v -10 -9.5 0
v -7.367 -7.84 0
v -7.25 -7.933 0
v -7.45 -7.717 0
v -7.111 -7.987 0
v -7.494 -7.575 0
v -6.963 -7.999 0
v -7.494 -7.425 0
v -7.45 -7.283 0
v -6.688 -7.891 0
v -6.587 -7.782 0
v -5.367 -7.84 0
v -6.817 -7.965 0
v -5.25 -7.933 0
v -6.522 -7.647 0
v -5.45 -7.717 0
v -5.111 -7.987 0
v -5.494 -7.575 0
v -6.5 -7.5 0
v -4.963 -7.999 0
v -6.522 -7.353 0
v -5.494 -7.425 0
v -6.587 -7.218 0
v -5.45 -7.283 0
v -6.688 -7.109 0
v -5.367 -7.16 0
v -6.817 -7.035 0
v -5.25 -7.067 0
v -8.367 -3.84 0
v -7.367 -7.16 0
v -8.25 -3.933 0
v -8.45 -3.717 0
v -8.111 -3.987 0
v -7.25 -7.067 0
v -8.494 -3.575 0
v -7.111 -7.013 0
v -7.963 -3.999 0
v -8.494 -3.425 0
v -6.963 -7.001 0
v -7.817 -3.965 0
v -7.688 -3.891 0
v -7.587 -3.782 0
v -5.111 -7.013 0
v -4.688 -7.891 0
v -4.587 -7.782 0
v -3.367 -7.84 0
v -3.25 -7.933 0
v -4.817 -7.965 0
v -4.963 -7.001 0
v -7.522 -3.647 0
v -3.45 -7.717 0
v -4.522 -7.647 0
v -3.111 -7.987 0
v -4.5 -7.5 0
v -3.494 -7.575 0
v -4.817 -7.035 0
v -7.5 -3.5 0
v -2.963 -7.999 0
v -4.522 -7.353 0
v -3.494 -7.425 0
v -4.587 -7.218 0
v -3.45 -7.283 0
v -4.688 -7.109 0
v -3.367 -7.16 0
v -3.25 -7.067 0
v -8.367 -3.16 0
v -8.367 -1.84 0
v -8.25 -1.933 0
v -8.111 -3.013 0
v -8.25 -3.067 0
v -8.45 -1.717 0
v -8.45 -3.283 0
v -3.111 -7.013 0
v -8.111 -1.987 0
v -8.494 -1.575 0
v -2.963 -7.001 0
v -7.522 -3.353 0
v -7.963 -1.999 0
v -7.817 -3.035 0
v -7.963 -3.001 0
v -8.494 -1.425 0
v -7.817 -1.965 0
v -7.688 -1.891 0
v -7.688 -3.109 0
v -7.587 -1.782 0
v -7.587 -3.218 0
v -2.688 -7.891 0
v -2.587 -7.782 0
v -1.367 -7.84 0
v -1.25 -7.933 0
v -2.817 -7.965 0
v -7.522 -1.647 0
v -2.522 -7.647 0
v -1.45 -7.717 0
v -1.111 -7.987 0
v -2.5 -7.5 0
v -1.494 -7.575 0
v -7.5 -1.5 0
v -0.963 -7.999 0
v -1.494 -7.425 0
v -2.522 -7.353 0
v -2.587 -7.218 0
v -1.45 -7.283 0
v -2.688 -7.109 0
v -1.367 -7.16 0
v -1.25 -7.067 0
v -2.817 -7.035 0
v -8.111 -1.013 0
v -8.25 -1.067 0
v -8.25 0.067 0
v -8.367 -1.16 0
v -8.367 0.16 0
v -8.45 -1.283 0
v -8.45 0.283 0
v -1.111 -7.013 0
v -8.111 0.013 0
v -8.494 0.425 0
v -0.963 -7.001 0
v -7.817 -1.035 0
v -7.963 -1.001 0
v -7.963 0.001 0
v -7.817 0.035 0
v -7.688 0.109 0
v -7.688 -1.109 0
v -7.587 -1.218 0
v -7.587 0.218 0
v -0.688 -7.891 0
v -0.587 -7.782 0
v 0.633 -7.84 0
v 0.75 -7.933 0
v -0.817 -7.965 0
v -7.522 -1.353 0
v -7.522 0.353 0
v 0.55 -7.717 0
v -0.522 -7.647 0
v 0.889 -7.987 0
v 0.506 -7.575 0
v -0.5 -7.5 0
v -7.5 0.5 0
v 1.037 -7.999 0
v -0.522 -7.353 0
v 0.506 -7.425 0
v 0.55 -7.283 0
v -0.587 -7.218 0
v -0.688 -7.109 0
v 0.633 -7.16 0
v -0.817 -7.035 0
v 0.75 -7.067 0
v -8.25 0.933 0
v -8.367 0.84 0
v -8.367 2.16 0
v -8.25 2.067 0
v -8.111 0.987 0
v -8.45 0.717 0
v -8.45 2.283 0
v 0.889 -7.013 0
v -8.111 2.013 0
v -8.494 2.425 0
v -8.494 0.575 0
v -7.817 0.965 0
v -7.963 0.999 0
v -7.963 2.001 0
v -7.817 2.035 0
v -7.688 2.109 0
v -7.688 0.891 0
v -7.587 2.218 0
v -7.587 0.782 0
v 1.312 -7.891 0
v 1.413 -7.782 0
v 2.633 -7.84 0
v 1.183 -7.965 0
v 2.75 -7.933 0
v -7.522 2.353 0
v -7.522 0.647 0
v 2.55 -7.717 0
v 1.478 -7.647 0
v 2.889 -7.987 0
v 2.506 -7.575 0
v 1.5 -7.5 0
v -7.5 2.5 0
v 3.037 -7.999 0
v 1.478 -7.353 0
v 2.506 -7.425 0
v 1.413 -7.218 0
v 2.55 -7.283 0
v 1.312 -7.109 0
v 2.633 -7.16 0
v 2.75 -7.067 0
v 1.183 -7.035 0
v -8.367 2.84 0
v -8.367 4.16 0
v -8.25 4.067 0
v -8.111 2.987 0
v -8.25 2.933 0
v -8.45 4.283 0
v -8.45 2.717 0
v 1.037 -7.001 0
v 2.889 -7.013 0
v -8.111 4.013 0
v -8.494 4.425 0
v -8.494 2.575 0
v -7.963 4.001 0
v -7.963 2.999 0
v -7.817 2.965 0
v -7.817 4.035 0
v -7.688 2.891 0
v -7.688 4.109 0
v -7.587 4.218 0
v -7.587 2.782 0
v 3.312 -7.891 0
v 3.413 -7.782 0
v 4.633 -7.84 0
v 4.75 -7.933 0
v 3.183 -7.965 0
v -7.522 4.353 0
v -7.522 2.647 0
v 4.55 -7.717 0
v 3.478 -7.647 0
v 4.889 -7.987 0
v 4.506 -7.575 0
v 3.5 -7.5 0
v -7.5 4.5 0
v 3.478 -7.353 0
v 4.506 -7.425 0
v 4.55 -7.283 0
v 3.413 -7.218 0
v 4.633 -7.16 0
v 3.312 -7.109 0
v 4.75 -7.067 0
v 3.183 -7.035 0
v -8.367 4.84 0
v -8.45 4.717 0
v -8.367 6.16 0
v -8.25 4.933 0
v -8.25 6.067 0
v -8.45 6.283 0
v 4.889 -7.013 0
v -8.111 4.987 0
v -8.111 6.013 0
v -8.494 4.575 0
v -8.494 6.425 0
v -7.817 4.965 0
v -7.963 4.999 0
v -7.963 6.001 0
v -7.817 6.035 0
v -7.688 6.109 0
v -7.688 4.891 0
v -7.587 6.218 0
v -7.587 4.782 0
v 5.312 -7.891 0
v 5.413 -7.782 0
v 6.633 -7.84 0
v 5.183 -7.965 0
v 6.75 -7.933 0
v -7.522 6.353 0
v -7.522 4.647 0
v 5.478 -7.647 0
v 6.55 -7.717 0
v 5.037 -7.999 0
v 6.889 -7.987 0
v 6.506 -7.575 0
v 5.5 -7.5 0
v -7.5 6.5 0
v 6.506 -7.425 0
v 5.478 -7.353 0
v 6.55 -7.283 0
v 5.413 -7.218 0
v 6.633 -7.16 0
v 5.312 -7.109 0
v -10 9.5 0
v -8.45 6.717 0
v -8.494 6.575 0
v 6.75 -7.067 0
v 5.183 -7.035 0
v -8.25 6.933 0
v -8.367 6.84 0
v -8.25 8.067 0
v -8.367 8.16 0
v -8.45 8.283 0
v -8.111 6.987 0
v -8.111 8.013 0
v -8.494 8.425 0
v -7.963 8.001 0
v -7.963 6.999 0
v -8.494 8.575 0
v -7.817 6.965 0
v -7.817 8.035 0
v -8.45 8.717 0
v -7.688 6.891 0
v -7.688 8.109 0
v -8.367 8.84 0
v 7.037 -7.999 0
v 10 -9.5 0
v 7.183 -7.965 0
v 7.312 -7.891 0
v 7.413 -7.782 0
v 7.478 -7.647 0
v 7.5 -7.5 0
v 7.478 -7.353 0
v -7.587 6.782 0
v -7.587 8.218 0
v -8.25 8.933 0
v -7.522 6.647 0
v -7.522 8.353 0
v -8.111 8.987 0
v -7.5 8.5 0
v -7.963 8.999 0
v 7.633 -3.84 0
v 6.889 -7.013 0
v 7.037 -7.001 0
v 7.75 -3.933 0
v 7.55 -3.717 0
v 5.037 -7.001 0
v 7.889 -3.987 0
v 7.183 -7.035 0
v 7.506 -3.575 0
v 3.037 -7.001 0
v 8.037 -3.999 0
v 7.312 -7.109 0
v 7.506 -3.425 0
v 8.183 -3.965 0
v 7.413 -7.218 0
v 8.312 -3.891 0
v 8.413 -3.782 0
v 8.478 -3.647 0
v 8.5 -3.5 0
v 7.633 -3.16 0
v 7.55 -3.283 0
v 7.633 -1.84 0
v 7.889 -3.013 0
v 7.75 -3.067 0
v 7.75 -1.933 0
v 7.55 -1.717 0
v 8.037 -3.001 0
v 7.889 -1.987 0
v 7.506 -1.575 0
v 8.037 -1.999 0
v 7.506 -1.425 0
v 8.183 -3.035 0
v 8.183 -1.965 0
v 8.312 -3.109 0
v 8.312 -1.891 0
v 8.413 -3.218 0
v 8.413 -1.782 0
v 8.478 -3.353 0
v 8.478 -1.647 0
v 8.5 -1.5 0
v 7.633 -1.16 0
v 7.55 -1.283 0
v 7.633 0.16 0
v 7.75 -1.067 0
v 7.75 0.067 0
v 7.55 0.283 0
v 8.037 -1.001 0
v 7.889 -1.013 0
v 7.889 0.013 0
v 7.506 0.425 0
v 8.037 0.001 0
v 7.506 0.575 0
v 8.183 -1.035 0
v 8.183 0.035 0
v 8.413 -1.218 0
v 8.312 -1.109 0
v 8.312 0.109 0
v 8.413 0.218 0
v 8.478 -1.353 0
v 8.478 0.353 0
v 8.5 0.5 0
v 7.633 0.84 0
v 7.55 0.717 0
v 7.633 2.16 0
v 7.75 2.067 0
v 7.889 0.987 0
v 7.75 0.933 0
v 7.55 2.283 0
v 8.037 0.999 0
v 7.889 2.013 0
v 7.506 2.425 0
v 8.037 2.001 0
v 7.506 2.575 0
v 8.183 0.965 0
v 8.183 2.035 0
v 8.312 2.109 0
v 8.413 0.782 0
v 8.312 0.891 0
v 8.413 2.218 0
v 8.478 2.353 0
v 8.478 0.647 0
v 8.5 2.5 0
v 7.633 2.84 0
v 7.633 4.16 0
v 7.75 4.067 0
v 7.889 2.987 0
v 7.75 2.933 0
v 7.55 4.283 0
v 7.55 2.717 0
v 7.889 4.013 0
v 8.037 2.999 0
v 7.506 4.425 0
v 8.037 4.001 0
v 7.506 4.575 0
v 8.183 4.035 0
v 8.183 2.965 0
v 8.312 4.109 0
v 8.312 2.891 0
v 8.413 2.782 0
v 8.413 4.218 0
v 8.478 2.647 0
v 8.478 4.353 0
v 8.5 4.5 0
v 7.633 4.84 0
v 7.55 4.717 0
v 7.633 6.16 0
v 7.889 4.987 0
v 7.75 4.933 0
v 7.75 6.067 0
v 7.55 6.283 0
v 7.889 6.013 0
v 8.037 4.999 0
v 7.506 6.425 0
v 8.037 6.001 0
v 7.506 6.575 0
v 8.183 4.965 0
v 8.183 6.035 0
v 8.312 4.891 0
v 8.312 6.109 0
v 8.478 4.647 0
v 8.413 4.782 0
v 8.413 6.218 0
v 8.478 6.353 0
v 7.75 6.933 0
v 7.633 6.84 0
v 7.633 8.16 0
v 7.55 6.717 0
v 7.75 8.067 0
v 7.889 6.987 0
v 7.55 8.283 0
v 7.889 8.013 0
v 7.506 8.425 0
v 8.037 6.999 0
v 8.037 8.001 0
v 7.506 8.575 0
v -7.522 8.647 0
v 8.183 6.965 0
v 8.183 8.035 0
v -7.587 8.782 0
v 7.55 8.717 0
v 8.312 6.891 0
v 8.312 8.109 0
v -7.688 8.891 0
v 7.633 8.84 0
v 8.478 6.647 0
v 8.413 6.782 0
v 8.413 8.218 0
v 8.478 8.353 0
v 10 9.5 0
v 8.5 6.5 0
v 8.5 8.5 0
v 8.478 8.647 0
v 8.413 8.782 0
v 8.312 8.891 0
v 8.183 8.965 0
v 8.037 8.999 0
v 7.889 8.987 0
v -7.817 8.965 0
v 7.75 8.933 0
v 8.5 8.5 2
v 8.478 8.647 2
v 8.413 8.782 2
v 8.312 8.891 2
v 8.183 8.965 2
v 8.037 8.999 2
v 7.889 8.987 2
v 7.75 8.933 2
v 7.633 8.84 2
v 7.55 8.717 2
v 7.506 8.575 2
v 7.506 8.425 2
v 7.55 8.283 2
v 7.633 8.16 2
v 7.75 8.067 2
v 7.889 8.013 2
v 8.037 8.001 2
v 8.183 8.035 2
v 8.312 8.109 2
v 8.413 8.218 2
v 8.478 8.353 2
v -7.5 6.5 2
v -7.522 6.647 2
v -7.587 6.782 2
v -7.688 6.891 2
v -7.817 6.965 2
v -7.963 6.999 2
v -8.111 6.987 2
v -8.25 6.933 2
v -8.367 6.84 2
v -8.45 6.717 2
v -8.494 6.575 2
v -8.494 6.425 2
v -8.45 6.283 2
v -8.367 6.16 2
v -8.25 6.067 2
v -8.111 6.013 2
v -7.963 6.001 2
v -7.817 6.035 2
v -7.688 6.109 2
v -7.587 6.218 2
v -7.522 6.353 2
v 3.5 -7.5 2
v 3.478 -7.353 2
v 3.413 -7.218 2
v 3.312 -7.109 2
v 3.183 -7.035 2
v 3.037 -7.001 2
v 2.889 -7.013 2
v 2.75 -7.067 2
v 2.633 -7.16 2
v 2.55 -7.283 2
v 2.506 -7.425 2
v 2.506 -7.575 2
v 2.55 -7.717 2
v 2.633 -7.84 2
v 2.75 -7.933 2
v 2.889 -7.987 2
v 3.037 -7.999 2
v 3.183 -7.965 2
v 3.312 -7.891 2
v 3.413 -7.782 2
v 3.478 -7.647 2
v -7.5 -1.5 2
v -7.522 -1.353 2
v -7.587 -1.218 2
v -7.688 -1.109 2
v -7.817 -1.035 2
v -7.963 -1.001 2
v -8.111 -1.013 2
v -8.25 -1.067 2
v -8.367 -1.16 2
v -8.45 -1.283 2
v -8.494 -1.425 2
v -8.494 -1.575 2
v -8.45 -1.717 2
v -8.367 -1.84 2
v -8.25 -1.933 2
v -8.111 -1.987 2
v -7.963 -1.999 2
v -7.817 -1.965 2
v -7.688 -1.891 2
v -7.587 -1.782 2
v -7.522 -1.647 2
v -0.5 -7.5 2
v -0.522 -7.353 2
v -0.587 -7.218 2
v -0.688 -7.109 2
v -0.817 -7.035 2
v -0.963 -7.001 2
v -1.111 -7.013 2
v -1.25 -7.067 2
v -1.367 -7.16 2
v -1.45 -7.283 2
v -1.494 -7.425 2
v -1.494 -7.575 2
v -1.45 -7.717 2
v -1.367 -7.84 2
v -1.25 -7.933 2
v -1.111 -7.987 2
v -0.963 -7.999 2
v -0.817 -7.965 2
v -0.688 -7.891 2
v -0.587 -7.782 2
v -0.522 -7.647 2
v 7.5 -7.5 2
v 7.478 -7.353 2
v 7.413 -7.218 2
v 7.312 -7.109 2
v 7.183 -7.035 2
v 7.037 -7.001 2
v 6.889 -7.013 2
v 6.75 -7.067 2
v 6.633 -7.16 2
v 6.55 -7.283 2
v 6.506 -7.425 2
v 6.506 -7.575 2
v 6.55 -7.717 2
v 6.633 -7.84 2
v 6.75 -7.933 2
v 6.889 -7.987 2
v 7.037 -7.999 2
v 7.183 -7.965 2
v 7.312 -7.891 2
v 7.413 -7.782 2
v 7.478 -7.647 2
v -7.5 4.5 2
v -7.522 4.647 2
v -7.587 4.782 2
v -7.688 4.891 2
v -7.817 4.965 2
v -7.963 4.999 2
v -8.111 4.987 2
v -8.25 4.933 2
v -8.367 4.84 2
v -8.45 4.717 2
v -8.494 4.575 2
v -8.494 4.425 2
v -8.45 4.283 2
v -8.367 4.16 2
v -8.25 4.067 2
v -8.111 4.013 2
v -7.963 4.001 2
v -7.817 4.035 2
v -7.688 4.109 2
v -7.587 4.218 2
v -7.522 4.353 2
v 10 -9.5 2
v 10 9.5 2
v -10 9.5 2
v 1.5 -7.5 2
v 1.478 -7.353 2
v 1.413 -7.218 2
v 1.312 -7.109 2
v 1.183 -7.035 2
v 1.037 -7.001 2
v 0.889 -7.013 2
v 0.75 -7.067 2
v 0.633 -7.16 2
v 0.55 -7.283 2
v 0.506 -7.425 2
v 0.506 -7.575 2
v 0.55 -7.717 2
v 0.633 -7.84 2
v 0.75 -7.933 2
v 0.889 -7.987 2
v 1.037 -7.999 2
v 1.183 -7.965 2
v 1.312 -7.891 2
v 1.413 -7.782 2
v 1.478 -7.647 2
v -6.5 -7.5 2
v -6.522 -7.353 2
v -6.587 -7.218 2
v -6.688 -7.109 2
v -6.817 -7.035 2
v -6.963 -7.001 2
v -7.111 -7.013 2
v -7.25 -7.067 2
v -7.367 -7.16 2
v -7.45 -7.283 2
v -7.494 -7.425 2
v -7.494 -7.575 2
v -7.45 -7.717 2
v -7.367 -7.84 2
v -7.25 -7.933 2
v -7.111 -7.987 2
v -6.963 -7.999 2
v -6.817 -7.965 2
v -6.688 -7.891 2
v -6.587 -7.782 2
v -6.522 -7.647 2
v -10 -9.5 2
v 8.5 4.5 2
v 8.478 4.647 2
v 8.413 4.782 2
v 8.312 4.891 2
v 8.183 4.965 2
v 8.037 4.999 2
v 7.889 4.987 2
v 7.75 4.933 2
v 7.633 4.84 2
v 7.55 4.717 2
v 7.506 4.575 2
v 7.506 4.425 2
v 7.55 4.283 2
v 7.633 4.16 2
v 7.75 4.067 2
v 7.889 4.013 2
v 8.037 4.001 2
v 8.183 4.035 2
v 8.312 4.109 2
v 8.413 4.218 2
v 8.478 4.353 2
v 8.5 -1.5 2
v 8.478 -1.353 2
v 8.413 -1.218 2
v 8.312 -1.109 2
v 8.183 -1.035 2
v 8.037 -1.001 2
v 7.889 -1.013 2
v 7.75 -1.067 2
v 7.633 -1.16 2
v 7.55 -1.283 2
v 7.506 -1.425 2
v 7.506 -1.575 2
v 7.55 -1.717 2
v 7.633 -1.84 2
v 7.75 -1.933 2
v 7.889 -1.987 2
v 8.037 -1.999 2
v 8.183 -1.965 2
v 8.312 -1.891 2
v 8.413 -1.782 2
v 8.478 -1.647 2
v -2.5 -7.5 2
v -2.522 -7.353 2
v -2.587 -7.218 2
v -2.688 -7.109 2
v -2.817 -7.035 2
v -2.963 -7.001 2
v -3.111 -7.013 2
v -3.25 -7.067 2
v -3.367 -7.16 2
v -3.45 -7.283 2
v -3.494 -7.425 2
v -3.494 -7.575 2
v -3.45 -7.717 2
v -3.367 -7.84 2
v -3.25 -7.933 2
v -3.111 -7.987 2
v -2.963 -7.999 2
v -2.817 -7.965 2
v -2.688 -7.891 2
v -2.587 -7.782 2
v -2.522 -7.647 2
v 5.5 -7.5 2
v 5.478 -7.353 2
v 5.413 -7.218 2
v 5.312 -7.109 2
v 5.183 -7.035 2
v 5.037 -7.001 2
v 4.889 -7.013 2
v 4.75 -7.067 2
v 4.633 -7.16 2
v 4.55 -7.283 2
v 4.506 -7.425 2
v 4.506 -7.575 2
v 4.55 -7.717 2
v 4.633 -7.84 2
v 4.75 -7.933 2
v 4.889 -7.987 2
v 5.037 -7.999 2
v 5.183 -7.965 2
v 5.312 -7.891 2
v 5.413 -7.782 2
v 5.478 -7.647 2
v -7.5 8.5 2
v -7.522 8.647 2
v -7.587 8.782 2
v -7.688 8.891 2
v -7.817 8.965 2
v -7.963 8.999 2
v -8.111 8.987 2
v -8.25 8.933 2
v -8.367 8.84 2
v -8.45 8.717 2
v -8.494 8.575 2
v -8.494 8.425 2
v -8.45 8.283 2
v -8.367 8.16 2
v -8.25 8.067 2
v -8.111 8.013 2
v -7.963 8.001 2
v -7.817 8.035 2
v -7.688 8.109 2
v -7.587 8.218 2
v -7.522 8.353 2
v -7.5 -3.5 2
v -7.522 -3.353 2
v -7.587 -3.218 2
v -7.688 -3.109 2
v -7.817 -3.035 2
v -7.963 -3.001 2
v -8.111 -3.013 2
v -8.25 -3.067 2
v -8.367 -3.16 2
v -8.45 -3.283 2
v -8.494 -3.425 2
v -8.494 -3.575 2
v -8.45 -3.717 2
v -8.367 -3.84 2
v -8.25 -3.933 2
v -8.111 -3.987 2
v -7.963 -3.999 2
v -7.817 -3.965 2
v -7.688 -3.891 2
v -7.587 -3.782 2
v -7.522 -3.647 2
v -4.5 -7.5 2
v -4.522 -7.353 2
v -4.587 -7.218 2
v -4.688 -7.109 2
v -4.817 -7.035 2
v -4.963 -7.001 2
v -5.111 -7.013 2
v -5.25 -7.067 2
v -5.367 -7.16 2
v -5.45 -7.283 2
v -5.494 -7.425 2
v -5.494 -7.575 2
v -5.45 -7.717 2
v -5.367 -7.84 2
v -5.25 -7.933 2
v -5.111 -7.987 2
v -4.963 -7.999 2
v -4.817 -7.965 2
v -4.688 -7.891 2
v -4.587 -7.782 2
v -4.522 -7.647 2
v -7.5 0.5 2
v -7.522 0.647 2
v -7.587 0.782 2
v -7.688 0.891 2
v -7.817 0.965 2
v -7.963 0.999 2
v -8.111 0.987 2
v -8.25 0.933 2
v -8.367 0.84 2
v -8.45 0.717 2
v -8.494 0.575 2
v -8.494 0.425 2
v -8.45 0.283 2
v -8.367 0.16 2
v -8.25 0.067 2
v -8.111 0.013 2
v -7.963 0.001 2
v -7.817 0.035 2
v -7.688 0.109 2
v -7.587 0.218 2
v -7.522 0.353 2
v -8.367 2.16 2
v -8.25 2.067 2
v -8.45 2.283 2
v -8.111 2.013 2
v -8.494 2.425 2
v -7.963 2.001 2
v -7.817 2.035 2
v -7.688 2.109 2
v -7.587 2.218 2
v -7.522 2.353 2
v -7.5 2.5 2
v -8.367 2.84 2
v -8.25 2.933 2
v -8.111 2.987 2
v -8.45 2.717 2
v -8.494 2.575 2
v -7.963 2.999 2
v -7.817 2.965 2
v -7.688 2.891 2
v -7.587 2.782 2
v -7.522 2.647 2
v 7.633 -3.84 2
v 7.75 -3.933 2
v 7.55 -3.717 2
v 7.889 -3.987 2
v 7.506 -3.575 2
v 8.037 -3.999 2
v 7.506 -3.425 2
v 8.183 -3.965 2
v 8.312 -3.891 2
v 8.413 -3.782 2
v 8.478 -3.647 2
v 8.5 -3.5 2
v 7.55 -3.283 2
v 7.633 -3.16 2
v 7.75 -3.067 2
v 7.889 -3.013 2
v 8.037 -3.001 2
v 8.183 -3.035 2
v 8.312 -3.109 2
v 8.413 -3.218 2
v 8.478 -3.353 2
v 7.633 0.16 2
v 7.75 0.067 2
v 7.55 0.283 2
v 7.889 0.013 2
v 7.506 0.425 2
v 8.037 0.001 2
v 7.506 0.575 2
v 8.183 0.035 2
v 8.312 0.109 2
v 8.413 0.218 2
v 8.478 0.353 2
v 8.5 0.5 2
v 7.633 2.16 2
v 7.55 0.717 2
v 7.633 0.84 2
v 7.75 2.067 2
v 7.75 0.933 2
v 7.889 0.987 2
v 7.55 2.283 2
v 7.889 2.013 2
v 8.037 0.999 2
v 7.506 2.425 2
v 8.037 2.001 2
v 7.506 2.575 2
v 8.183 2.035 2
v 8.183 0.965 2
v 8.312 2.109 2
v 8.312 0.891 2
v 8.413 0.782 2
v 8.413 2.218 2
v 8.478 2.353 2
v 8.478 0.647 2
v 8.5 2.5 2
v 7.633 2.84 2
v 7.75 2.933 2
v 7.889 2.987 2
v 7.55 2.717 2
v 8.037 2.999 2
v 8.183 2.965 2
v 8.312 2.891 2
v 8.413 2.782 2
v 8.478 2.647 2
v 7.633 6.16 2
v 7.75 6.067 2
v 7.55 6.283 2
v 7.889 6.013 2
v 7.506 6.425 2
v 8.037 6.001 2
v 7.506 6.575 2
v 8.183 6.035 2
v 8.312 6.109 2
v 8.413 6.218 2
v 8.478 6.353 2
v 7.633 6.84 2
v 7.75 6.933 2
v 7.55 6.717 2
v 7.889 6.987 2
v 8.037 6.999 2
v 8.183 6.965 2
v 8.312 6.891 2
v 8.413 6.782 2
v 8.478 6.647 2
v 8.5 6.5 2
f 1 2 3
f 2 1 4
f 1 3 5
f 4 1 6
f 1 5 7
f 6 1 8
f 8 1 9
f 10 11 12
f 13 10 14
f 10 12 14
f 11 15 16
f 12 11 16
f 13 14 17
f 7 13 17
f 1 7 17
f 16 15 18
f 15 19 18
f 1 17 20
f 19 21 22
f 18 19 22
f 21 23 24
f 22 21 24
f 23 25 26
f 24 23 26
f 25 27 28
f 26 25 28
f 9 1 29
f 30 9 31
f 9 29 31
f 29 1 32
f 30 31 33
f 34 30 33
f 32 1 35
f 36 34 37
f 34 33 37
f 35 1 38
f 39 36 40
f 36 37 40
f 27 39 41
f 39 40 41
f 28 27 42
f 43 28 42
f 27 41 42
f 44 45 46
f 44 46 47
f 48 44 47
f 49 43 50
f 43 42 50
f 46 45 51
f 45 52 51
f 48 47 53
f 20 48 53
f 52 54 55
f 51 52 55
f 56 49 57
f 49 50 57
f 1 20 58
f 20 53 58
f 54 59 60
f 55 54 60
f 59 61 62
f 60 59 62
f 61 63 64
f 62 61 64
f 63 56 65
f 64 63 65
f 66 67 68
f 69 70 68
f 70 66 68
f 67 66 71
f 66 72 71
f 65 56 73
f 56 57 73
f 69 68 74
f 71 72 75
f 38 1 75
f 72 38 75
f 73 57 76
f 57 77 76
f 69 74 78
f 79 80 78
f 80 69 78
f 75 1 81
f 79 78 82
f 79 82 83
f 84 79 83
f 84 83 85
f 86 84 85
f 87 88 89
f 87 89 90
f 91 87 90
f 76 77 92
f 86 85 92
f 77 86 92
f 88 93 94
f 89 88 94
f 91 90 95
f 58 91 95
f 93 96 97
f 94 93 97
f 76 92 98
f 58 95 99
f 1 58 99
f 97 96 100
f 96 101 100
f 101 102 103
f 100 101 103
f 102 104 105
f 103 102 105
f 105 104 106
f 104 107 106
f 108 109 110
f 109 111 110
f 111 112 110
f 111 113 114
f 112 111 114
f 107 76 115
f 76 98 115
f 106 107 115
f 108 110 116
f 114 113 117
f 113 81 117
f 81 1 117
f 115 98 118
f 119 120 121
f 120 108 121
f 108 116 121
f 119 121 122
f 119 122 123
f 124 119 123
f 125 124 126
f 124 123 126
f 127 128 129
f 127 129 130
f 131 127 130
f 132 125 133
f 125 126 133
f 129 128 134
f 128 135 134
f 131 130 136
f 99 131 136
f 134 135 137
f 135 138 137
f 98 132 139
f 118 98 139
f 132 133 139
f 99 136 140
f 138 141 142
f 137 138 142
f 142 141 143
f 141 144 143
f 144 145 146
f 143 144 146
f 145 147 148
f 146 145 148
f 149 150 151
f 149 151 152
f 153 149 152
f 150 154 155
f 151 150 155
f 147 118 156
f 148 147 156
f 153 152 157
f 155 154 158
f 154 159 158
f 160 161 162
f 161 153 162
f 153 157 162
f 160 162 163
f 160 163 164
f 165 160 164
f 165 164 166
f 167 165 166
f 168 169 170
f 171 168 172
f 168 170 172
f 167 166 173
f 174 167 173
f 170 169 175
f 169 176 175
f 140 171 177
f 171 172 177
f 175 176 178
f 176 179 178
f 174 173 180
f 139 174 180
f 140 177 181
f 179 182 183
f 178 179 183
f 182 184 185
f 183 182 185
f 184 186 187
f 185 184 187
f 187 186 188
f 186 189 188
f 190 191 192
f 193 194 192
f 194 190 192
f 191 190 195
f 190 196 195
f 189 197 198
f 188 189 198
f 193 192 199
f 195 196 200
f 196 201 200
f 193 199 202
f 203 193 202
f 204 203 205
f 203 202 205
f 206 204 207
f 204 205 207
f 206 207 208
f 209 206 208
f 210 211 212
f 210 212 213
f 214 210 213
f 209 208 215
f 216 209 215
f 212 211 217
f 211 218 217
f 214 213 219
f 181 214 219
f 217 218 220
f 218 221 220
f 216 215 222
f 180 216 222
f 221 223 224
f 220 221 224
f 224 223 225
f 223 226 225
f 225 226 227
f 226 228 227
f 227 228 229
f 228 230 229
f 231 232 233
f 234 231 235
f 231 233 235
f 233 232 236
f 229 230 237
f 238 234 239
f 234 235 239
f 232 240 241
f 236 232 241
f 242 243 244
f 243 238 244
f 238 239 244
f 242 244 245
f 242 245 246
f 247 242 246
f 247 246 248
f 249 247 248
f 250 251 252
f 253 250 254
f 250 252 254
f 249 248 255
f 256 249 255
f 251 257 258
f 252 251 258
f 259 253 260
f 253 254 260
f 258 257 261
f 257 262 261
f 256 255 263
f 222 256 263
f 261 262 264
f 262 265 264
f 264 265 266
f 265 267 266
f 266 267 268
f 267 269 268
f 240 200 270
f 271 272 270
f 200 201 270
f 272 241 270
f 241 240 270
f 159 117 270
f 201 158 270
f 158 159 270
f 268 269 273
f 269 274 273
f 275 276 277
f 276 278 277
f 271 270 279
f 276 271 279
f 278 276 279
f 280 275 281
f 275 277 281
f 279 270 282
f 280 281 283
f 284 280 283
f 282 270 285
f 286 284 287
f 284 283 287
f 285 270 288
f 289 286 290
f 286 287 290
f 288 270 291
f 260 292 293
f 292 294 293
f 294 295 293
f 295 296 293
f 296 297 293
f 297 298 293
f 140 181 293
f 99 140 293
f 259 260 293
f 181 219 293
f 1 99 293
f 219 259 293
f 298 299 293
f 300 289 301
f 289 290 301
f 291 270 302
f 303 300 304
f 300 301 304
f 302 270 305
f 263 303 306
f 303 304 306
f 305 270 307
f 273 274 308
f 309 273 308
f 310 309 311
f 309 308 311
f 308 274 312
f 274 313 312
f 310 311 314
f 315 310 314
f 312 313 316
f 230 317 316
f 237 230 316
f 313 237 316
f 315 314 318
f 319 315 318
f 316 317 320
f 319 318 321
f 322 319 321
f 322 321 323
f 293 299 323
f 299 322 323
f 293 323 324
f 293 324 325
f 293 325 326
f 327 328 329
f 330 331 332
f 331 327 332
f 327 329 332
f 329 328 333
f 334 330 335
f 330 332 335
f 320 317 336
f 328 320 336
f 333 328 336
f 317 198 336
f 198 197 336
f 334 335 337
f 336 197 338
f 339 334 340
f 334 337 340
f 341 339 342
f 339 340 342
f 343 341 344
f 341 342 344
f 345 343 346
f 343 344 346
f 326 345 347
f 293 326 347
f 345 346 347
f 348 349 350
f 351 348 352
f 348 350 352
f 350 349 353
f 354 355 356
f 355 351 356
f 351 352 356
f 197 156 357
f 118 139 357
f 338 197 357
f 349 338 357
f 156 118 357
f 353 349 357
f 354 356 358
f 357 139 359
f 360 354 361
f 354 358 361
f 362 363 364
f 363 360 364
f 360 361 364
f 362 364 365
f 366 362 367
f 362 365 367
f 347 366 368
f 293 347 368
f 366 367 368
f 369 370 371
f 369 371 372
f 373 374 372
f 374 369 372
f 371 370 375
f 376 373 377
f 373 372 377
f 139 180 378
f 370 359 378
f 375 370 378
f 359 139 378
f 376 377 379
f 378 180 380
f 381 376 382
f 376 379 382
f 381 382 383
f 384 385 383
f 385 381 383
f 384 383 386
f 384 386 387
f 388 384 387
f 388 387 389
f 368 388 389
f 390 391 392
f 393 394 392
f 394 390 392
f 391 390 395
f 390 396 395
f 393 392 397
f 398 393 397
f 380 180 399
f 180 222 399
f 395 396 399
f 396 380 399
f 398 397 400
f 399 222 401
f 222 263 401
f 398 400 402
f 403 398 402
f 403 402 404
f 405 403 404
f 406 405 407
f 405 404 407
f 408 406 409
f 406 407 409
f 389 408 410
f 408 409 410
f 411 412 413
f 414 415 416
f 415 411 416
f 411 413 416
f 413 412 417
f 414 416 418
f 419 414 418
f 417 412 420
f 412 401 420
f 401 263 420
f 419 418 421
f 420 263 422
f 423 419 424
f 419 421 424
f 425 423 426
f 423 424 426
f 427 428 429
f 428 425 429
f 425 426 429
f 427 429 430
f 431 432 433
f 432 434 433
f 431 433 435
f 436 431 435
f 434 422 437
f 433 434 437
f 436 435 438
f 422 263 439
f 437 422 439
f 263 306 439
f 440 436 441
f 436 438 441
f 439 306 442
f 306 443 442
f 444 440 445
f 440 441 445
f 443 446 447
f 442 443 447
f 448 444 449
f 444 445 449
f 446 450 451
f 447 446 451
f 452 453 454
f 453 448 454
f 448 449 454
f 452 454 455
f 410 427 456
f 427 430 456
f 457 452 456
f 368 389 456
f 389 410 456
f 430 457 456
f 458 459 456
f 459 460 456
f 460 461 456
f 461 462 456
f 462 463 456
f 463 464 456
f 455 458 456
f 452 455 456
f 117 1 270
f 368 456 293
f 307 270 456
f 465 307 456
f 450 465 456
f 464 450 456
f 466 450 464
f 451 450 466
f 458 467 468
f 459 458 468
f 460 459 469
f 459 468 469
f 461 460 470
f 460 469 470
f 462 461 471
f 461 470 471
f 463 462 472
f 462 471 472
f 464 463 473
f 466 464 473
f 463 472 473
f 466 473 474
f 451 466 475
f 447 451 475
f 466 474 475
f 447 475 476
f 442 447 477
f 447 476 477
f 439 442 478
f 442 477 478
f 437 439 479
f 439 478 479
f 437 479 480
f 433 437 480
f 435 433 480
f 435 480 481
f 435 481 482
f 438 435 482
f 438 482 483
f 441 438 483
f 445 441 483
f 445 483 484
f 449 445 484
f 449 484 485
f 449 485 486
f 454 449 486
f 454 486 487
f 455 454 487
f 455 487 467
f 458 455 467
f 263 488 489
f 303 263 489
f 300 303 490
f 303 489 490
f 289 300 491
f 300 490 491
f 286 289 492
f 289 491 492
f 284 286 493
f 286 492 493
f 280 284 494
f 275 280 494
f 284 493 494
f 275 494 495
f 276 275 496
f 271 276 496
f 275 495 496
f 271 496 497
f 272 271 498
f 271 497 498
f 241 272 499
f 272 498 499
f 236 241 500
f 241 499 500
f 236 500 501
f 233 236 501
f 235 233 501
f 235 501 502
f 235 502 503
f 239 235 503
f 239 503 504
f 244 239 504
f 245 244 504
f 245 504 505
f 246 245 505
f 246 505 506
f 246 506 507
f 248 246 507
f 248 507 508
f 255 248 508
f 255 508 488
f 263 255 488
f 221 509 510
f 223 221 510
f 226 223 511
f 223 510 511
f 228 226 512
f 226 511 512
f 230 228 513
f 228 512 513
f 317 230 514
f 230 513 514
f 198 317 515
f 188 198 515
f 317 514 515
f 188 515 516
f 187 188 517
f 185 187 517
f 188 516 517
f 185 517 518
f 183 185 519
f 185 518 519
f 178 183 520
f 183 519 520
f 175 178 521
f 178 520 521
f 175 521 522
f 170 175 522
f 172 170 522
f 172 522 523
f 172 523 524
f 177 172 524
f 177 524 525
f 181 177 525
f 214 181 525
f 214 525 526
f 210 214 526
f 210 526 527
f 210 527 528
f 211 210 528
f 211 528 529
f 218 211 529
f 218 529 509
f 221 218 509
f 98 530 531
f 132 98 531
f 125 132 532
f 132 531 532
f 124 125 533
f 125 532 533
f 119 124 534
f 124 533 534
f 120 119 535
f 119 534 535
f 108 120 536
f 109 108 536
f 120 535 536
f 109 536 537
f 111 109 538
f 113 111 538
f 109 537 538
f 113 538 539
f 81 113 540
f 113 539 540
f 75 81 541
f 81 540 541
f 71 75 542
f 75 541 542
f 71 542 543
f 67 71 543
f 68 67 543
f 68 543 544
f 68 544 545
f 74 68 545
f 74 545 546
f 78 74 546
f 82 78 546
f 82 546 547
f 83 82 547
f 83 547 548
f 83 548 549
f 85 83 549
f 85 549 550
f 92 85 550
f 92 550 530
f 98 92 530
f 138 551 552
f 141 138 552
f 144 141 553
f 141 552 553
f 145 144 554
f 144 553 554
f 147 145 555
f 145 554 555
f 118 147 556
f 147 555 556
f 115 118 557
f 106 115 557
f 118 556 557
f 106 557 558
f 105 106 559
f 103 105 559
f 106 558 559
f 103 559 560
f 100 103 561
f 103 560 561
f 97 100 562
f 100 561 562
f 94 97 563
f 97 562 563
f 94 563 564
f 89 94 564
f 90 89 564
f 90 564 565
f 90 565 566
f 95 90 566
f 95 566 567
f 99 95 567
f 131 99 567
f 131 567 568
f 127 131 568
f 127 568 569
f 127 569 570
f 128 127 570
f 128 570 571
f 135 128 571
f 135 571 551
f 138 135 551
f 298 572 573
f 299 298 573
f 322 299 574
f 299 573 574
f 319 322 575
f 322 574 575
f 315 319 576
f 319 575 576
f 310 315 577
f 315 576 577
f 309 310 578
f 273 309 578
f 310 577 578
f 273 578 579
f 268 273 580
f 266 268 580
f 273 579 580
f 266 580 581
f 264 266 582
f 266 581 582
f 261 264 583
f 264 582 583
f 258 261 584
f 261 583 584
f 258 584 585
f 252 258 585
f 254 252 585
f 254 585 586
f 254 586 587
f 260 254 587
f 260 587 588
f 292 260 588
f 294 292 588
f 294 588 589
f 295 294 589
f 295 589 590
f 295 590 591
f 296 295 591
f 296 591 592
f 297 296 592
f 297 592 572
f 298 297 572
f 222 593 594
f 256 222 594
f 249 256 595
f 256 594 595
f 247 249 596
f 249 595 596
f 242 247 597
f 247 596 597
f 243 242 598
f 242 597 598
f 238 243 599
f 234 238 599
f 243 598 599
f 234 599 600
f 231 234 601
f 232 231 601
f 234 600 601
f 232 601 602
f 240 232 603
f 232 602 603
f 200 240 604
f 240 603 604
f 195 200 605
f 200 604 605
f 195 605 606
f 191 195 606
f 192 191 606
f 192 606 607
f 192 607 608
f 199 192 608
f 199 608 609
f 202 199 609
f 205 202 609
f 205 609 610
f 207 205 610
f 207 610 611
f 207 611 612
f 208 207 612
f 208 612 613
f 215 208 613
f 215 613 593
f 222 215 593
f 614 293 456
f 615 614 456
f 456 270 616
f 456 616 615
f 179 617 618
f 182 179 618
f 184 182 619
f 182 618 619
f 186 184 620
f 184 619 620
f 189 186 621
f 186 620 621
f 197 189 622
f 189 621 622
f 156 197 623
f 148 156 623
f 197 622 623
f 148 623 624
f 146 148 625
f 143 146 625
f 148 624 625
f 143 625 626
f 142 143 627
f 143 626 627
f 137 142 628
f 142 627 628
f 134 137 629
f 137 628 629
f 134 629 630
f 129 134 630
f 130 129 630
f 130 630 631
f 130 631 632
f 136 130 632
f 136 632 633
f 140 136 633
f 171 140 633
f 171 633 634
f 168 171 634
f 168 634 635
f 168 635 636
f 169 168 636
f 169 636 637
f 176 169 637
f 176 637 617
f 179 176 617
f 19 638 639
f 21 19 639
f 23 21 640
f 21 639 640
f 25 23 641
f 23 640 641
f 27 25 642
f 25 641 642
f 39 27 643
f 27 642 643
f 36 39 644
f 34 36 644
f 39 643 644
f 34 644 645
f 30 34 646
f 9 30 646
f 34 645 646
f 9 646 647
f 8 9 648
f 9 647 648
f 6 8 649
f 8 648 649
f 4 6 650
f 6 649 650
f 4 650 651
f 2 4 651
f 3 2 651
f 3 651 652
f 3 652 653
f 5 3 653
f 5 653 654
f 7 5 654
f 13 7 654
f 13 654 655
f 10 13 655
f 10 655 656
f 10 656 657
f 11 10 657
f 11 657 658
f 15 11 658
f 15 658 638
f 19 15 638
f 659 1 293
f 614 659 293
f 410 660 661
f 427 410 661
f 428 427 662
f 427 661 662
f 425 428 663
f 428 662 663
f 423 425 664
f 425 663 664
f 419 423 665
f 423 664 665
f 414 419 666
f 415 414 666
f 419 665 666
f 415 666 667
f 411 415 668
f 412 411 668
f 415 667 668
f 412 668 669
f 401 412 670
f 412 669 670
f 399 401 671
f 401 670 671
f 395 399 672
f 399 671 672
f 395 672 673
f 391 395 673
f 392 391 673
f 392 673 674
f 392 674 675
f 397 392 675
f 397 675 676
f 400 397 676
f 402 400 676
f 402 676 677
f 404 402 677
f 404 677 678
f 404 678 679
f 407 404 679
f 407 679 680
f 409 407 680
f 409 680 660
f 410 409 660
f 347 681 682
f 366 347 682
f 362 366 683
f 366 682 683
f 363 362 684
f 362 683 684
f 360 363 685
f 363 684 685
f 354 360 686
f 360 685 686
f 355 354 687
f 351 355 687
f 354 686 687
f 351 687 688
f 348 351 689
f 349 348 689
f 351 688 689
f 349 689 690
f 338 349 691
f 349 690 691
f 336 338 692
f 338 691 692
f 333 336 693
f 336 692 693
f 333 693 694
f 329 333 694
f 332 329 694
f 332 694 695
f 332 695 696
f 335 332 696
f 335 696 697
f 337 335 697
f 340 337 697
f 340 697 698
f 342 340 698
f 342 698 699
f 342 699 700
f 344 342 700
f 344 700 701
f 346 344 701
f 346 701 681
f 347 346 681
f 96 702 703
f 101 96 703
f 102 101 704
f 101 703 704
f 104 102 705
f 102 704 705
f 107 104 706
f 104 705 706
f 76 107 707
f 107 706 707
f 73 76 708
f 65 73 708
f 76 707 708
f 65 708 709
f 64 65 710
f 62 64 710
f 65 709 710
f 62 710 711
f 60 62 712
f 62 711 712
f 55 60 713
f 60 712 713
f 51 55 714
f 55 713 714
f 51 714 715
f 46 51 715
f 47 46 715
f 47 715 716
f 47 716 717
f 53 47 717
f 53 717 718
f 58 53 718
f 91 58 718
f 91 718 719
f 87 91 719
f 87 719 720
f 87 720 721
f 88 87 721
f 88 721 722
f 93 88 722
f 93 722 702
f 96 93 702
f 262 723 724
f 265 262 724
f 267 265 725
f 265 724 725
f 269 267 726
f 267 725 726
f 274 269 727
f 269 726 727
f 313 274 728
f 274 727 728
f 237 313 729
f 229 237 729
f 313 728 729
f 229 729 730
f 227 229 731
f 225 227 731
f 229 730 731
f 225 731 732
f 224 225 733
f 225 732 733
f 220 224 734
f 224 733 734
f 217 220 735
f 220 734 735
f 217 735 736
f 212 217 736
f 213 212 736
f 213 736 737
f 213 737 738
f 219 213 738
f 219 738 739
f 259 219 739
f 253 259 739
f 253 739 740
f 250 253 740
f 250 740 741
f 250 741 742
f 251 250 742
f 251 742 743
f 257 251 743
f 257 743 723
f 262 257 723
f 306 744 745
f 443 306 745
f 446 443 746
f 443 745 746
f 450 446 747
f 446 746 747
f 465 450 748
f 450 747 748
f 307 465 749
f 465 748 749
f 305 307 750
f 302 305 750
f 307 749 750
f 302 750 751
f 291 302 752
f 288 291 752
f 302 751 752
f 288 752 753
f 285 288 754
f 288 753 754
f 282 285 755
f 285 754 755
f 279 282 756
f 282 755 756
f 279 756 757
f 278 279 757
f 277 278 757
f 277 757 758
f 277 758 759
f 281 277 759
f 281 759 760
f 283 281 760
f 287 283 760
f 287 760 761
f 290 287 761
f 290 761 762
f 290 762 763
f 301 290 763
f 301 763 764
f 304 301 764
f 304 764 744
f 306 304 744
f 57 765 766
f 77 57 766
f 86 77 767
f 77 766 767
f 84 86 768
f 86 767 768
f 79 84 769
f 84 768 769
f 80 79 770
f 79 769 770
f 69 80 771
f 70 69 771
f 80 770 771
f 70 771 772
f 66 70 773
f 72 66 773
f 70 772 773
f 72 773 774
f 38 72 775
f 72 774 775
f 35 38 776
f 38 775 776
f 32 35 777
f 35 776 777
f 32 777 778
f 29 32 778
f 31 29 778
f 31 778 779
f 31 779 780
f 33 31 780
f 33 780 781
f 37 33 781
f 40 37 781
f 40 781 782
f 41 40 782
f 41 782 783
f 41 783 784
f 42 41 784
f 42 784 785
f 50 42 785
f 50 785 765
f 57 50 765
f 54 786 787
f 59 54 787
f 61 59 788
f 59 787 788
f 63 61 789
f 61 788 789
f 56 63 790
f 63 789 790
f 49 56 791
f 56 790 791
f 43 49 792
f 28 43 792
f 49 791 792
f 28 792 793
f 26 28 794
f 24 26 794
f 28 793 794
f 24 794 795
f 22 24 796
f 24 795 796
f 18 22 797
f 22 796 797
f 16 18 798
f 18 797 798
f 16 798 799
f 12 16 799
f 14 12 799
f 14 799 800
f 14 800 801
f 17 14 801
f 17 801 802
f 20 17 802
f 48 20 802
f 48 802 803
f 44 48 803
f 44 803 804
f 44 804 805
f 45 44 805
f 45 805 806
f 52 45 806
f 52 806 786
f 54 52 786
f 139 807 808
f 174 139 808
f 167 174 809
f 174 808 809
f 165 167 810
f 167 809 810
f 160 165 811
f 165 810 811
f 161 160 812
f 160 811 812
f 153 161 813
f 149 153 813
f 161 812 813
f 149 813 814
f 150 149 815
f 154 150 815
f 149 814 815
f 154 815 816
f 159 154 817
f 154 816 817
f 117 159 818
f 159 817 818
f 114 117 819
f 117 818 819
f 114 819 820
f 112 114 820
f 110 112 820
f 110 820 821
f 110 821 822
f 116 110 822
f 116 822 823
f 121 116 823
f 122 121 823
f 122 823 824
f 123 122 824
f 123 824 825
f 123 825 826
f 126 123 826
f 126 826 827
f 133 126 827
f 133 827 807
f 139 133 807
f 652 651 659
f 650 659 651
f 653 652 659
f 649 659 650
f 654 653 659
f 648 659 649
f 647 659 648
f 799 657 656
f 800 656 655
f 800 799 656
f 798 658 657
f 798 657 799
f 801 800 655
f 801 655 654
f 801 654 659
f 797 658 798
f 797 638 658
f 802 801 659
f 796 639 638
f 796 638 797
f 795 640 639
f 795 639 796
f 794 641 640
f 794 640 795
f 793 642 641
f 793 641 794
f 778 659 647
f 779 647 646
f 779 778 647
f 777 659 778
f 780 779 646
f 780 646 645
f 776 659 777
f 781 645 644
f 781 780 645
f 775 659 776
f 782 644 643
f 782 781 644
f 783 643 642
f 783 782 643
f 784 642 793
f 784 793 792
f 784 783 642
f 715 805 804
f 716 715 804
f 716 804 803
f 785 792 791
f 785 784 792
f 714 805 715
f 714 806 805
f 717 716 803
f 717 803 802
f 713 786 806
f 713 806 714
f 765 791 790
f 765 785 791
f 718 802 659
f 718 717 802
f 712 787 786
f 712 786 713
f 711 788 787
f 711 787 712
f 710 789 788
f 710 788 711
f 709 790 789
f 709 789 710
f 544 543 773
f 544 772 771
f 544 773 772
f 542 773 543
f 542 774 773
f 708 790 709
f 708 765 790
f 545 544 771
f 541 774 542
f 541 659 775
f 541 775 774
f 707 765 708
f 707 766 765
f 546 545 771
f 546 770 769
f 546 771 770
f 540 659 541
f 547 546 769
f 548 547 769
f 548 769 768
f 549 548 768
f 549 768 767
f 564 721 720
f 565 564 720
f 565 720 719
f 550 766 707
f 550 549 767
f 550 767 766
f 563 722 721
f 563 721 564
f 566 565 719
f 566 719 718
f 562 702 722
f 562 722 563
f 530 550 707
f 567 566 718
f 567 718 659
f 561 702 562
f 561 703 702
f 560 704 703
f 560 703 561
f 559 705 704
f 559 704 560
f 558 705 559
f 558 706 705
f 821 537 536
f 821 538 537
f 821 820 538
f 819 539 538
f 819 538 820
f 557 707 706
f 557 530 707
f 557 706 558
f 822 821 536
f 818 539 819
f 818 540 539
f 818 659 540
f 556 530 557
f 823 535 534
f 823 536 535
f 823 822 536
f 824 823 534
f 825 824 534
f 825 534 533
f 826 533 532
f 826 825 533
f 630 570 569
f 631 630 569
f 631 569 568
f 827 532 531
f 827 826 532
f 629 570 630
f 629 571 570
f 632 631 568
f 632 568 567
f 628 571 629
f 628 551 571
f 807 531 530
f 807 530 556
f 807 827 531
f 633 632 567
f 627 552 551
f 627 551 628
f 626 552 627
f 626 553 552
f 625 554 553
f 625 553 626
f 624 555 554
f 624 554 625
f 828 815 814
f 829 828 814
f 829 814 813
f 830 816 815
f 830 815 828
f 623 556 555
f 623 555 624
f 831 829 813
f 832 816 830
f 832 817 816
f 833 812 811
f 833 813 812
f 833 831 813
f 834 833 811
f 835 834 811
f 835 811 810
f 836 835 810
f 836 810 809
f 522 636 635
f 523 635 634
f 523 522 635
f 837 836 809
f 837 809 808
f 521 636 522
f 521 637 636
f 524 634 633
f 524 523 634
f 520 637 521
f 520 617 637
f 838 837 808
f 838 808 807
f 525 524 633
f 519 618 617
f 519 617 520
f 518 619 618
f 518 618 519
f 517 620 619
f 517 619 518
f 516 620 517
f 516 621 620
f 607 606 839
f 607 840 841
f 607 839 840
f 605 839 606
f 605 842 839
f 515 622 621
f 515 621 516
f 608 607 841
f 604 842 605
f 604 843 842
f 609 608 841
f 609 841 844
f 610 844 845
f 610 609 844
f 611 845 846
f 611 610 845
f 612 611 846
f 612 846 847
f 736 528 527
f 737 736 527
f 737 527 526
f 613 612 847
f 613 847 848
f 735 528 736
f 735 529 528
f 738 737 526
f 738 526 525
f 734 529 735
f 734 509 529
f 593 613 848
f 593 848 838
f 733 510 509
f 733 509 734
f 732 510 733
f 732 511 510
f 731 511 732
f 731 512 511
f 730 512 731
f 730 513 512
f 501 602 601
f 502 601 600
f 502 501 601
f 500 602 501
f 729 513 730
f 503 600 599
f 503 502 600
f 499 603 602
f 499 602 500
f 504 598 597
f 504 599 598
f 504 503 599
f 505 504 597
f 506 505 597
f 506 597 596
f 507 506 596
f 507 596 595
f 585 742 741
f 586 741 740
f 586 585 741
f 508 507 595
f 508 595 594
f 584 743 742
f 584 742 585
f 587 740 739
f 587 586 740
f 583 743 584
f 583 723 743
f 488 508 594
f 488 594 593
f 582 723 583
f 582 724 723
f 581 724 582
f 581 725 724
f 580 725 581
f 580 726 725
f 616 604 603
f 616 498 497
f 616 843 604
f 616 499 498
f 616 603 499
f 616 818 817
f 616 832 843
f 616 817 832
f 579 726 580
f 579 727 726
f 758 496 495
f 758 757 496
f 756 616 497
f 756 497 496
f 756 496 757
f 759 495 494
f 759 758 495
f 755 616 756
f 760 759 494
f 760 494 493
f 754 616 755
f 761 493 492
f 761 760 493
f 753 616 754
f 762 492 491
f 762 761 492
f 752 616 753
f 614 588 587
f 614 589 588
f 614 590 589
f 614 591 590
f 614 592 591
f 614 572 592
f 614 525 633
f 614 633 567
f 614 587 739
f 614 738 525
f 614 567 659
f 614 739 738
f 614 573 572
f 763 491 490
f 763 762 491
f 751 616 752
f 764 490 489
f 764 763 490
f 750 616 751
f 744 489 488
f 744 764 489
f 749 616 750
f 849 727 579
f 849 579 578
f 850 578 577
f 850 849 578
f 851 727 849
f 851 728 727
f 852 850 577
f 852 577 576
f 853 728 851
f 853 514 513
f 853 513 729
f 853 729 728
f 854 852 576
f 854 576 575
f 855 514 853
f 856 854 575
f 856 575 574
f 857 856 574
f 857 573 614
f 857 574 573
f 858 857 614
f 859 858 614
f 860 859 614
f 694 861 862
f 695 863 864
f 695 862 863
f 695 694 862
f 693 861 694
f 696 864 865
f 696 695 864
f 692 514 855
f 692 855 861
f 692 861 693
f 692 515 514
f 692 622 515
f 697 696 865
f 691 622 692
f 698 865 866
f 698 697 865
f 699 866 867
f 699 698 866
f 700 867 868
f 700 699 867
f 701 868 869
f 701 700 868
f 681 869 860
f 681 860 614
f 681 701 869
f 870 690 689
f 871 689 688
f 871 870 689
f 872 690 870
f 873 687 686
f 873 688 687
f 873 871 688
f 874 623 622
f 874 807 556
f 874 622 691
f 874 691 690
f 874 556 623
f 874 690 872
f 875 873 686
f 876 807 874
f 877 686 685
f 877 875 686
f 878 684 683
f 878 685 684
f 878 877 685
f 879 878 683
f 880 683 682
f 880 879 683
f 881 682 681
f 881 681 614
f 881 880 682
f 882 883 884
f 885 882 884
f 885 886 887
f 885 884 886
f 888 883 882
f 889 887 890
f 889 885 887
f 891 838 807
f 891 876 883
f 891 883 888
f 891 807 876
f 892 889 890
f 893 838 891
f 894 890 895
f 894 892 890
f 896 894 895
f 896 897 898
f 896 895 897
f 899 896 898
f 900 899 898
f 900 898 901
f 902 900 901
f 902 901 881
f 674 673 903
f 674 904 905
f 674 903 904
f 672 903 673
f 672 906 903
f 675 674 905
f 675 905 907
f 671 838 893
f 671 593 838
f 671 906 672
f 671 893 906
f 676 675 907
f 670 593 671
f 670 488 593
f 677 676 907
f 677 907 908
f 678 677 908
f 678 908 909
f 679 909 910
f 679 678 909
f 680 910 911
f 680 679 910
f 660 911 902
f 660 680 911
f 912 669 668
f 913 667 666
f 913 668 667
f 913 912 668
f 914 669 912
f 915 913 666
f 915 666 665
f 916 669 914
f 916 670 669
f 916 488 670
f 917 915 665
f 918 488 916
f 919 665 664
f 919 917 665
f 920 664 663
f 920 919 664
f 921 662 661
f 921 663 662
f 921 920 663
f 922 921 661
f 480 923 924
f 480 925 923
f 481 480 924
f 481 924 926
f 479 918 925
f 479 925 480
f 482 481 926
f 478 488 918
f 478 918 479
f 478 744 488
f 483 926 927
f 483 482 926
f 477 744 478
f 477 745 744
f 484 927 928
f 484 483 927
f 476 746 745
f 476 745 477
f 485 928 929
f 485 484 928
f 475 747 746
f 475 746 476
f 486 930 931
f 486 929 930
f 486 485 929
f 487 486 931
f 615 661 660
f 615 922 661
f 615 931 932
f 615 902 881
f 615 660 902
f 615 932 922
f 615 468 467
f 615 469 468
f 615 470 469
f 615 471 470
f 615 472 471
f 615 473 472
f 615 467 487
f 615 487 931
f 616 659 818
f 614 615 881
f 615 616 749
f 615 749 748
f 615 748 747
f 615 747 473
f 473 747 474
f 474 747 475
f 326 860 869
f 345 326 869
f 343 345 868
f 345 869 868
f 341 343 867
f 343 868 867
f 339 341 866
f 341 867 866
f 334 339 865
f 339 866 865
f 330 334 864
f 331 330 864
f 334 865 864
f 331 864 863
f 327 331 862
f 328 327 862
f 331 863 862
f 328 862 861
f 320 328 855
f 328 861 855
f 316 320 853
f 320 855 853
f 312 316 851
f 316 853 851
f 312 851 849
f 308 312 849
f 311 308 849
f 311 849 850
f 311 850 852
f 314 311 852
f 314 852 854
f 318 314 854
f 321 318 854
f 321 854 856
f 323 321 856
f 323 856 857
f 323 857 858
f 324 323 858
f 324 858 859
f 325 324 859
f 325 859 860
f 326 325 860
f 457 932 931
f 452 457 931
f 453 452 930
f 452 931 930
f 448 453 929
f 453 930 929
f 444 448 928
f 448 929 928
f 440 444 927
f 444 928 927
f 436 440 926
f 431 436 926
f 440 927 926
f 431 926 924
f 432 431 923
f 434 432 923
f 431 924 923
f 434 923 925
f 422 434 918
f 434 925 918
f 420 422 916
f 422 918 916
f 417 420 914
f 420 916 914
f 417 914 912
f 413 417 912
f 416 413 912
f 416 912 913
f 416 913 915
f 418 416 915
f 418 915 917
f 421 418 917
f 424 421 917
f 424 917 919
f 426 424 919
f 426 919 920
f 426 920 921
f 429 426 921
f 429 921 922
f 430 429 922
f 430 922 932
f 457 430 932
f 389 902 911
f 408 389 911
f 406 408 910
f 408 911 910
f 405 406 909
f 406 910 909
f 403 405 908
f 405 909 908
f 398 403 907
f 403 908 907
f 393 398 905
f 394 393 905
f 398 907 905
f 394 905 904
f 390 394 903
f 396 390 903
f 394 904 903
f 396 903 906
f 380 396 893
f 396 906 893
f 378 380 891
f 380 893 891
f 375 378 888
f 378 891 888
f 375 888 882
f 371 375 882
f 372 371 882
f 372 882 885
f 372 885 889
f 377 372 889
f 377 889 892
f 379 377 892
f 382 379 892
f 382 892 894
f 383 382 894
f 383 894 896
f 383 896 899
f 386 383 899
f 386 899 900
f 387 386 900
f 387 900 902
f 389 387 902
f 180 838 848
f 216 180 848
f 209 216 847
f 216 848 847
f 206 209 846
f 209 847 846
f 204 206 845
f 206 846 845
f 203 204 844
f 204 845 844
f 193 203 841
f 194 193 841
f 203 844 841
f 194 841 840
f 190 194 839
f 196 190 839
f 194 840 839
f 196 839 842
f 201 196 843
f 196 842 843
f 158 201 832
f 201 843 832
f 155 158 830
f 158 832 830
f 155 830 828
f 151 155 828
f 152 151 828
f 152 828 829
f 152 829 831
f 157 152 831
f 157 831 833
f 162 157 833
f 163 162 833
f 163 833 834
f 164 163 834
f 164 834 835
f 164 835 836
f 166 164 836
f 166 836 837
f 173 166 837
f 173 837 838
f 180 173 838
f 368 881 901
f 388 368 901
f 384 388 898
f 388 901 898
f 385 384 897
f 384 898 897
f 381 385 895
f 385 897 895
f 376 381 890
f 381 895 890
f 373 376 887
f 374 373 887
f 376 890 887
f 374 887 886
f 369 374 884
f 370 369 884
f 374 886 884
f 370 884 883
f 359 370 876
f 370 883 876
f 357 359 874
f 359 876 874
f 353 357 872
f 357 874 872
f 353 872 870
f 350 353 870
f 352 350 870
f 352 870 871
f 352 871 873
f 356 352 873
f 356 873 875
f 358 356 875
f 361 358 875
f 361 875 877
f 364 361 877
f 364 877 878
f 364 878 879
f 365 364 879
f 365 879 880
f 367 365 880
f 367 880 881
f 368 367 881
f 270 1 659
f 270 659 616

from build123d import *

# Parameters (mm, degrees)
SKETCH_W               = 20
SKETCH_H               = 19
PAD_DEPTH              = 2
SKETCH001_R            = 0.5
POCKET_DEPTH           = 5
LINEARPATTERN_COUNT    = 7
LINEARPATTERN_PITCH    = 2
SKETCH002_R            = 0.5
POCKET001_DEPTH        = 5
LINEARPATTERN001_COUNT = 8
LINEARPATTERN001_PITCH = 2


with BuildPart() as part:
    # Sketch → Pad (new body)
    with BuildSketch(Plane.XY):
        Rectangle(SKETCH_W, SKETCH_H)
    extrude(amount=PAD_DEPTH)

    # Sketch001 (on Face6 of Pad) → Pocket (cut)
    with BuildSketch(Plane.XY.offset(2)):
        with Locations((-8, 8.5)):
            Circle(SKETCH001_R)
        with Locations((8, 8.5)):
            Circle(SKETCH001_R)
    pocket = extrude(amount=-POCKET_DEPTH, mode=Mode.SUBTRACT)

    # LinearPattern: Pocket ×7
    with Locations(*[(0, -i * LINEARPATTERN_PITCH, 0) for i in range(1, LINEARPATTERN_COUNT)]):
        add(pocket, mode=Mode.SUBTRACT)

    # Sketch002 (on Face5 of LinearPattern) → Pocket001 (cut)
    with BuildSketch(Plane.XY.offset(2)):
        with Locations((-7, -7.5)):
            Circle(SKETCH002_R)
    pocket001 = extrude(amount=-POCKET001_DEPTH, mode=Mode.SUBTRACT)

    # LinearPattern001: Pocket001 ×8
    with Locations(*[(i * LINEARPATTERN001_PITCH, 0, 0) for i in range(1, LINEARPATTERN001_COUNT)]):
        add(pocket001, mode=Mode.SUBTRACT)


solid = part.part
